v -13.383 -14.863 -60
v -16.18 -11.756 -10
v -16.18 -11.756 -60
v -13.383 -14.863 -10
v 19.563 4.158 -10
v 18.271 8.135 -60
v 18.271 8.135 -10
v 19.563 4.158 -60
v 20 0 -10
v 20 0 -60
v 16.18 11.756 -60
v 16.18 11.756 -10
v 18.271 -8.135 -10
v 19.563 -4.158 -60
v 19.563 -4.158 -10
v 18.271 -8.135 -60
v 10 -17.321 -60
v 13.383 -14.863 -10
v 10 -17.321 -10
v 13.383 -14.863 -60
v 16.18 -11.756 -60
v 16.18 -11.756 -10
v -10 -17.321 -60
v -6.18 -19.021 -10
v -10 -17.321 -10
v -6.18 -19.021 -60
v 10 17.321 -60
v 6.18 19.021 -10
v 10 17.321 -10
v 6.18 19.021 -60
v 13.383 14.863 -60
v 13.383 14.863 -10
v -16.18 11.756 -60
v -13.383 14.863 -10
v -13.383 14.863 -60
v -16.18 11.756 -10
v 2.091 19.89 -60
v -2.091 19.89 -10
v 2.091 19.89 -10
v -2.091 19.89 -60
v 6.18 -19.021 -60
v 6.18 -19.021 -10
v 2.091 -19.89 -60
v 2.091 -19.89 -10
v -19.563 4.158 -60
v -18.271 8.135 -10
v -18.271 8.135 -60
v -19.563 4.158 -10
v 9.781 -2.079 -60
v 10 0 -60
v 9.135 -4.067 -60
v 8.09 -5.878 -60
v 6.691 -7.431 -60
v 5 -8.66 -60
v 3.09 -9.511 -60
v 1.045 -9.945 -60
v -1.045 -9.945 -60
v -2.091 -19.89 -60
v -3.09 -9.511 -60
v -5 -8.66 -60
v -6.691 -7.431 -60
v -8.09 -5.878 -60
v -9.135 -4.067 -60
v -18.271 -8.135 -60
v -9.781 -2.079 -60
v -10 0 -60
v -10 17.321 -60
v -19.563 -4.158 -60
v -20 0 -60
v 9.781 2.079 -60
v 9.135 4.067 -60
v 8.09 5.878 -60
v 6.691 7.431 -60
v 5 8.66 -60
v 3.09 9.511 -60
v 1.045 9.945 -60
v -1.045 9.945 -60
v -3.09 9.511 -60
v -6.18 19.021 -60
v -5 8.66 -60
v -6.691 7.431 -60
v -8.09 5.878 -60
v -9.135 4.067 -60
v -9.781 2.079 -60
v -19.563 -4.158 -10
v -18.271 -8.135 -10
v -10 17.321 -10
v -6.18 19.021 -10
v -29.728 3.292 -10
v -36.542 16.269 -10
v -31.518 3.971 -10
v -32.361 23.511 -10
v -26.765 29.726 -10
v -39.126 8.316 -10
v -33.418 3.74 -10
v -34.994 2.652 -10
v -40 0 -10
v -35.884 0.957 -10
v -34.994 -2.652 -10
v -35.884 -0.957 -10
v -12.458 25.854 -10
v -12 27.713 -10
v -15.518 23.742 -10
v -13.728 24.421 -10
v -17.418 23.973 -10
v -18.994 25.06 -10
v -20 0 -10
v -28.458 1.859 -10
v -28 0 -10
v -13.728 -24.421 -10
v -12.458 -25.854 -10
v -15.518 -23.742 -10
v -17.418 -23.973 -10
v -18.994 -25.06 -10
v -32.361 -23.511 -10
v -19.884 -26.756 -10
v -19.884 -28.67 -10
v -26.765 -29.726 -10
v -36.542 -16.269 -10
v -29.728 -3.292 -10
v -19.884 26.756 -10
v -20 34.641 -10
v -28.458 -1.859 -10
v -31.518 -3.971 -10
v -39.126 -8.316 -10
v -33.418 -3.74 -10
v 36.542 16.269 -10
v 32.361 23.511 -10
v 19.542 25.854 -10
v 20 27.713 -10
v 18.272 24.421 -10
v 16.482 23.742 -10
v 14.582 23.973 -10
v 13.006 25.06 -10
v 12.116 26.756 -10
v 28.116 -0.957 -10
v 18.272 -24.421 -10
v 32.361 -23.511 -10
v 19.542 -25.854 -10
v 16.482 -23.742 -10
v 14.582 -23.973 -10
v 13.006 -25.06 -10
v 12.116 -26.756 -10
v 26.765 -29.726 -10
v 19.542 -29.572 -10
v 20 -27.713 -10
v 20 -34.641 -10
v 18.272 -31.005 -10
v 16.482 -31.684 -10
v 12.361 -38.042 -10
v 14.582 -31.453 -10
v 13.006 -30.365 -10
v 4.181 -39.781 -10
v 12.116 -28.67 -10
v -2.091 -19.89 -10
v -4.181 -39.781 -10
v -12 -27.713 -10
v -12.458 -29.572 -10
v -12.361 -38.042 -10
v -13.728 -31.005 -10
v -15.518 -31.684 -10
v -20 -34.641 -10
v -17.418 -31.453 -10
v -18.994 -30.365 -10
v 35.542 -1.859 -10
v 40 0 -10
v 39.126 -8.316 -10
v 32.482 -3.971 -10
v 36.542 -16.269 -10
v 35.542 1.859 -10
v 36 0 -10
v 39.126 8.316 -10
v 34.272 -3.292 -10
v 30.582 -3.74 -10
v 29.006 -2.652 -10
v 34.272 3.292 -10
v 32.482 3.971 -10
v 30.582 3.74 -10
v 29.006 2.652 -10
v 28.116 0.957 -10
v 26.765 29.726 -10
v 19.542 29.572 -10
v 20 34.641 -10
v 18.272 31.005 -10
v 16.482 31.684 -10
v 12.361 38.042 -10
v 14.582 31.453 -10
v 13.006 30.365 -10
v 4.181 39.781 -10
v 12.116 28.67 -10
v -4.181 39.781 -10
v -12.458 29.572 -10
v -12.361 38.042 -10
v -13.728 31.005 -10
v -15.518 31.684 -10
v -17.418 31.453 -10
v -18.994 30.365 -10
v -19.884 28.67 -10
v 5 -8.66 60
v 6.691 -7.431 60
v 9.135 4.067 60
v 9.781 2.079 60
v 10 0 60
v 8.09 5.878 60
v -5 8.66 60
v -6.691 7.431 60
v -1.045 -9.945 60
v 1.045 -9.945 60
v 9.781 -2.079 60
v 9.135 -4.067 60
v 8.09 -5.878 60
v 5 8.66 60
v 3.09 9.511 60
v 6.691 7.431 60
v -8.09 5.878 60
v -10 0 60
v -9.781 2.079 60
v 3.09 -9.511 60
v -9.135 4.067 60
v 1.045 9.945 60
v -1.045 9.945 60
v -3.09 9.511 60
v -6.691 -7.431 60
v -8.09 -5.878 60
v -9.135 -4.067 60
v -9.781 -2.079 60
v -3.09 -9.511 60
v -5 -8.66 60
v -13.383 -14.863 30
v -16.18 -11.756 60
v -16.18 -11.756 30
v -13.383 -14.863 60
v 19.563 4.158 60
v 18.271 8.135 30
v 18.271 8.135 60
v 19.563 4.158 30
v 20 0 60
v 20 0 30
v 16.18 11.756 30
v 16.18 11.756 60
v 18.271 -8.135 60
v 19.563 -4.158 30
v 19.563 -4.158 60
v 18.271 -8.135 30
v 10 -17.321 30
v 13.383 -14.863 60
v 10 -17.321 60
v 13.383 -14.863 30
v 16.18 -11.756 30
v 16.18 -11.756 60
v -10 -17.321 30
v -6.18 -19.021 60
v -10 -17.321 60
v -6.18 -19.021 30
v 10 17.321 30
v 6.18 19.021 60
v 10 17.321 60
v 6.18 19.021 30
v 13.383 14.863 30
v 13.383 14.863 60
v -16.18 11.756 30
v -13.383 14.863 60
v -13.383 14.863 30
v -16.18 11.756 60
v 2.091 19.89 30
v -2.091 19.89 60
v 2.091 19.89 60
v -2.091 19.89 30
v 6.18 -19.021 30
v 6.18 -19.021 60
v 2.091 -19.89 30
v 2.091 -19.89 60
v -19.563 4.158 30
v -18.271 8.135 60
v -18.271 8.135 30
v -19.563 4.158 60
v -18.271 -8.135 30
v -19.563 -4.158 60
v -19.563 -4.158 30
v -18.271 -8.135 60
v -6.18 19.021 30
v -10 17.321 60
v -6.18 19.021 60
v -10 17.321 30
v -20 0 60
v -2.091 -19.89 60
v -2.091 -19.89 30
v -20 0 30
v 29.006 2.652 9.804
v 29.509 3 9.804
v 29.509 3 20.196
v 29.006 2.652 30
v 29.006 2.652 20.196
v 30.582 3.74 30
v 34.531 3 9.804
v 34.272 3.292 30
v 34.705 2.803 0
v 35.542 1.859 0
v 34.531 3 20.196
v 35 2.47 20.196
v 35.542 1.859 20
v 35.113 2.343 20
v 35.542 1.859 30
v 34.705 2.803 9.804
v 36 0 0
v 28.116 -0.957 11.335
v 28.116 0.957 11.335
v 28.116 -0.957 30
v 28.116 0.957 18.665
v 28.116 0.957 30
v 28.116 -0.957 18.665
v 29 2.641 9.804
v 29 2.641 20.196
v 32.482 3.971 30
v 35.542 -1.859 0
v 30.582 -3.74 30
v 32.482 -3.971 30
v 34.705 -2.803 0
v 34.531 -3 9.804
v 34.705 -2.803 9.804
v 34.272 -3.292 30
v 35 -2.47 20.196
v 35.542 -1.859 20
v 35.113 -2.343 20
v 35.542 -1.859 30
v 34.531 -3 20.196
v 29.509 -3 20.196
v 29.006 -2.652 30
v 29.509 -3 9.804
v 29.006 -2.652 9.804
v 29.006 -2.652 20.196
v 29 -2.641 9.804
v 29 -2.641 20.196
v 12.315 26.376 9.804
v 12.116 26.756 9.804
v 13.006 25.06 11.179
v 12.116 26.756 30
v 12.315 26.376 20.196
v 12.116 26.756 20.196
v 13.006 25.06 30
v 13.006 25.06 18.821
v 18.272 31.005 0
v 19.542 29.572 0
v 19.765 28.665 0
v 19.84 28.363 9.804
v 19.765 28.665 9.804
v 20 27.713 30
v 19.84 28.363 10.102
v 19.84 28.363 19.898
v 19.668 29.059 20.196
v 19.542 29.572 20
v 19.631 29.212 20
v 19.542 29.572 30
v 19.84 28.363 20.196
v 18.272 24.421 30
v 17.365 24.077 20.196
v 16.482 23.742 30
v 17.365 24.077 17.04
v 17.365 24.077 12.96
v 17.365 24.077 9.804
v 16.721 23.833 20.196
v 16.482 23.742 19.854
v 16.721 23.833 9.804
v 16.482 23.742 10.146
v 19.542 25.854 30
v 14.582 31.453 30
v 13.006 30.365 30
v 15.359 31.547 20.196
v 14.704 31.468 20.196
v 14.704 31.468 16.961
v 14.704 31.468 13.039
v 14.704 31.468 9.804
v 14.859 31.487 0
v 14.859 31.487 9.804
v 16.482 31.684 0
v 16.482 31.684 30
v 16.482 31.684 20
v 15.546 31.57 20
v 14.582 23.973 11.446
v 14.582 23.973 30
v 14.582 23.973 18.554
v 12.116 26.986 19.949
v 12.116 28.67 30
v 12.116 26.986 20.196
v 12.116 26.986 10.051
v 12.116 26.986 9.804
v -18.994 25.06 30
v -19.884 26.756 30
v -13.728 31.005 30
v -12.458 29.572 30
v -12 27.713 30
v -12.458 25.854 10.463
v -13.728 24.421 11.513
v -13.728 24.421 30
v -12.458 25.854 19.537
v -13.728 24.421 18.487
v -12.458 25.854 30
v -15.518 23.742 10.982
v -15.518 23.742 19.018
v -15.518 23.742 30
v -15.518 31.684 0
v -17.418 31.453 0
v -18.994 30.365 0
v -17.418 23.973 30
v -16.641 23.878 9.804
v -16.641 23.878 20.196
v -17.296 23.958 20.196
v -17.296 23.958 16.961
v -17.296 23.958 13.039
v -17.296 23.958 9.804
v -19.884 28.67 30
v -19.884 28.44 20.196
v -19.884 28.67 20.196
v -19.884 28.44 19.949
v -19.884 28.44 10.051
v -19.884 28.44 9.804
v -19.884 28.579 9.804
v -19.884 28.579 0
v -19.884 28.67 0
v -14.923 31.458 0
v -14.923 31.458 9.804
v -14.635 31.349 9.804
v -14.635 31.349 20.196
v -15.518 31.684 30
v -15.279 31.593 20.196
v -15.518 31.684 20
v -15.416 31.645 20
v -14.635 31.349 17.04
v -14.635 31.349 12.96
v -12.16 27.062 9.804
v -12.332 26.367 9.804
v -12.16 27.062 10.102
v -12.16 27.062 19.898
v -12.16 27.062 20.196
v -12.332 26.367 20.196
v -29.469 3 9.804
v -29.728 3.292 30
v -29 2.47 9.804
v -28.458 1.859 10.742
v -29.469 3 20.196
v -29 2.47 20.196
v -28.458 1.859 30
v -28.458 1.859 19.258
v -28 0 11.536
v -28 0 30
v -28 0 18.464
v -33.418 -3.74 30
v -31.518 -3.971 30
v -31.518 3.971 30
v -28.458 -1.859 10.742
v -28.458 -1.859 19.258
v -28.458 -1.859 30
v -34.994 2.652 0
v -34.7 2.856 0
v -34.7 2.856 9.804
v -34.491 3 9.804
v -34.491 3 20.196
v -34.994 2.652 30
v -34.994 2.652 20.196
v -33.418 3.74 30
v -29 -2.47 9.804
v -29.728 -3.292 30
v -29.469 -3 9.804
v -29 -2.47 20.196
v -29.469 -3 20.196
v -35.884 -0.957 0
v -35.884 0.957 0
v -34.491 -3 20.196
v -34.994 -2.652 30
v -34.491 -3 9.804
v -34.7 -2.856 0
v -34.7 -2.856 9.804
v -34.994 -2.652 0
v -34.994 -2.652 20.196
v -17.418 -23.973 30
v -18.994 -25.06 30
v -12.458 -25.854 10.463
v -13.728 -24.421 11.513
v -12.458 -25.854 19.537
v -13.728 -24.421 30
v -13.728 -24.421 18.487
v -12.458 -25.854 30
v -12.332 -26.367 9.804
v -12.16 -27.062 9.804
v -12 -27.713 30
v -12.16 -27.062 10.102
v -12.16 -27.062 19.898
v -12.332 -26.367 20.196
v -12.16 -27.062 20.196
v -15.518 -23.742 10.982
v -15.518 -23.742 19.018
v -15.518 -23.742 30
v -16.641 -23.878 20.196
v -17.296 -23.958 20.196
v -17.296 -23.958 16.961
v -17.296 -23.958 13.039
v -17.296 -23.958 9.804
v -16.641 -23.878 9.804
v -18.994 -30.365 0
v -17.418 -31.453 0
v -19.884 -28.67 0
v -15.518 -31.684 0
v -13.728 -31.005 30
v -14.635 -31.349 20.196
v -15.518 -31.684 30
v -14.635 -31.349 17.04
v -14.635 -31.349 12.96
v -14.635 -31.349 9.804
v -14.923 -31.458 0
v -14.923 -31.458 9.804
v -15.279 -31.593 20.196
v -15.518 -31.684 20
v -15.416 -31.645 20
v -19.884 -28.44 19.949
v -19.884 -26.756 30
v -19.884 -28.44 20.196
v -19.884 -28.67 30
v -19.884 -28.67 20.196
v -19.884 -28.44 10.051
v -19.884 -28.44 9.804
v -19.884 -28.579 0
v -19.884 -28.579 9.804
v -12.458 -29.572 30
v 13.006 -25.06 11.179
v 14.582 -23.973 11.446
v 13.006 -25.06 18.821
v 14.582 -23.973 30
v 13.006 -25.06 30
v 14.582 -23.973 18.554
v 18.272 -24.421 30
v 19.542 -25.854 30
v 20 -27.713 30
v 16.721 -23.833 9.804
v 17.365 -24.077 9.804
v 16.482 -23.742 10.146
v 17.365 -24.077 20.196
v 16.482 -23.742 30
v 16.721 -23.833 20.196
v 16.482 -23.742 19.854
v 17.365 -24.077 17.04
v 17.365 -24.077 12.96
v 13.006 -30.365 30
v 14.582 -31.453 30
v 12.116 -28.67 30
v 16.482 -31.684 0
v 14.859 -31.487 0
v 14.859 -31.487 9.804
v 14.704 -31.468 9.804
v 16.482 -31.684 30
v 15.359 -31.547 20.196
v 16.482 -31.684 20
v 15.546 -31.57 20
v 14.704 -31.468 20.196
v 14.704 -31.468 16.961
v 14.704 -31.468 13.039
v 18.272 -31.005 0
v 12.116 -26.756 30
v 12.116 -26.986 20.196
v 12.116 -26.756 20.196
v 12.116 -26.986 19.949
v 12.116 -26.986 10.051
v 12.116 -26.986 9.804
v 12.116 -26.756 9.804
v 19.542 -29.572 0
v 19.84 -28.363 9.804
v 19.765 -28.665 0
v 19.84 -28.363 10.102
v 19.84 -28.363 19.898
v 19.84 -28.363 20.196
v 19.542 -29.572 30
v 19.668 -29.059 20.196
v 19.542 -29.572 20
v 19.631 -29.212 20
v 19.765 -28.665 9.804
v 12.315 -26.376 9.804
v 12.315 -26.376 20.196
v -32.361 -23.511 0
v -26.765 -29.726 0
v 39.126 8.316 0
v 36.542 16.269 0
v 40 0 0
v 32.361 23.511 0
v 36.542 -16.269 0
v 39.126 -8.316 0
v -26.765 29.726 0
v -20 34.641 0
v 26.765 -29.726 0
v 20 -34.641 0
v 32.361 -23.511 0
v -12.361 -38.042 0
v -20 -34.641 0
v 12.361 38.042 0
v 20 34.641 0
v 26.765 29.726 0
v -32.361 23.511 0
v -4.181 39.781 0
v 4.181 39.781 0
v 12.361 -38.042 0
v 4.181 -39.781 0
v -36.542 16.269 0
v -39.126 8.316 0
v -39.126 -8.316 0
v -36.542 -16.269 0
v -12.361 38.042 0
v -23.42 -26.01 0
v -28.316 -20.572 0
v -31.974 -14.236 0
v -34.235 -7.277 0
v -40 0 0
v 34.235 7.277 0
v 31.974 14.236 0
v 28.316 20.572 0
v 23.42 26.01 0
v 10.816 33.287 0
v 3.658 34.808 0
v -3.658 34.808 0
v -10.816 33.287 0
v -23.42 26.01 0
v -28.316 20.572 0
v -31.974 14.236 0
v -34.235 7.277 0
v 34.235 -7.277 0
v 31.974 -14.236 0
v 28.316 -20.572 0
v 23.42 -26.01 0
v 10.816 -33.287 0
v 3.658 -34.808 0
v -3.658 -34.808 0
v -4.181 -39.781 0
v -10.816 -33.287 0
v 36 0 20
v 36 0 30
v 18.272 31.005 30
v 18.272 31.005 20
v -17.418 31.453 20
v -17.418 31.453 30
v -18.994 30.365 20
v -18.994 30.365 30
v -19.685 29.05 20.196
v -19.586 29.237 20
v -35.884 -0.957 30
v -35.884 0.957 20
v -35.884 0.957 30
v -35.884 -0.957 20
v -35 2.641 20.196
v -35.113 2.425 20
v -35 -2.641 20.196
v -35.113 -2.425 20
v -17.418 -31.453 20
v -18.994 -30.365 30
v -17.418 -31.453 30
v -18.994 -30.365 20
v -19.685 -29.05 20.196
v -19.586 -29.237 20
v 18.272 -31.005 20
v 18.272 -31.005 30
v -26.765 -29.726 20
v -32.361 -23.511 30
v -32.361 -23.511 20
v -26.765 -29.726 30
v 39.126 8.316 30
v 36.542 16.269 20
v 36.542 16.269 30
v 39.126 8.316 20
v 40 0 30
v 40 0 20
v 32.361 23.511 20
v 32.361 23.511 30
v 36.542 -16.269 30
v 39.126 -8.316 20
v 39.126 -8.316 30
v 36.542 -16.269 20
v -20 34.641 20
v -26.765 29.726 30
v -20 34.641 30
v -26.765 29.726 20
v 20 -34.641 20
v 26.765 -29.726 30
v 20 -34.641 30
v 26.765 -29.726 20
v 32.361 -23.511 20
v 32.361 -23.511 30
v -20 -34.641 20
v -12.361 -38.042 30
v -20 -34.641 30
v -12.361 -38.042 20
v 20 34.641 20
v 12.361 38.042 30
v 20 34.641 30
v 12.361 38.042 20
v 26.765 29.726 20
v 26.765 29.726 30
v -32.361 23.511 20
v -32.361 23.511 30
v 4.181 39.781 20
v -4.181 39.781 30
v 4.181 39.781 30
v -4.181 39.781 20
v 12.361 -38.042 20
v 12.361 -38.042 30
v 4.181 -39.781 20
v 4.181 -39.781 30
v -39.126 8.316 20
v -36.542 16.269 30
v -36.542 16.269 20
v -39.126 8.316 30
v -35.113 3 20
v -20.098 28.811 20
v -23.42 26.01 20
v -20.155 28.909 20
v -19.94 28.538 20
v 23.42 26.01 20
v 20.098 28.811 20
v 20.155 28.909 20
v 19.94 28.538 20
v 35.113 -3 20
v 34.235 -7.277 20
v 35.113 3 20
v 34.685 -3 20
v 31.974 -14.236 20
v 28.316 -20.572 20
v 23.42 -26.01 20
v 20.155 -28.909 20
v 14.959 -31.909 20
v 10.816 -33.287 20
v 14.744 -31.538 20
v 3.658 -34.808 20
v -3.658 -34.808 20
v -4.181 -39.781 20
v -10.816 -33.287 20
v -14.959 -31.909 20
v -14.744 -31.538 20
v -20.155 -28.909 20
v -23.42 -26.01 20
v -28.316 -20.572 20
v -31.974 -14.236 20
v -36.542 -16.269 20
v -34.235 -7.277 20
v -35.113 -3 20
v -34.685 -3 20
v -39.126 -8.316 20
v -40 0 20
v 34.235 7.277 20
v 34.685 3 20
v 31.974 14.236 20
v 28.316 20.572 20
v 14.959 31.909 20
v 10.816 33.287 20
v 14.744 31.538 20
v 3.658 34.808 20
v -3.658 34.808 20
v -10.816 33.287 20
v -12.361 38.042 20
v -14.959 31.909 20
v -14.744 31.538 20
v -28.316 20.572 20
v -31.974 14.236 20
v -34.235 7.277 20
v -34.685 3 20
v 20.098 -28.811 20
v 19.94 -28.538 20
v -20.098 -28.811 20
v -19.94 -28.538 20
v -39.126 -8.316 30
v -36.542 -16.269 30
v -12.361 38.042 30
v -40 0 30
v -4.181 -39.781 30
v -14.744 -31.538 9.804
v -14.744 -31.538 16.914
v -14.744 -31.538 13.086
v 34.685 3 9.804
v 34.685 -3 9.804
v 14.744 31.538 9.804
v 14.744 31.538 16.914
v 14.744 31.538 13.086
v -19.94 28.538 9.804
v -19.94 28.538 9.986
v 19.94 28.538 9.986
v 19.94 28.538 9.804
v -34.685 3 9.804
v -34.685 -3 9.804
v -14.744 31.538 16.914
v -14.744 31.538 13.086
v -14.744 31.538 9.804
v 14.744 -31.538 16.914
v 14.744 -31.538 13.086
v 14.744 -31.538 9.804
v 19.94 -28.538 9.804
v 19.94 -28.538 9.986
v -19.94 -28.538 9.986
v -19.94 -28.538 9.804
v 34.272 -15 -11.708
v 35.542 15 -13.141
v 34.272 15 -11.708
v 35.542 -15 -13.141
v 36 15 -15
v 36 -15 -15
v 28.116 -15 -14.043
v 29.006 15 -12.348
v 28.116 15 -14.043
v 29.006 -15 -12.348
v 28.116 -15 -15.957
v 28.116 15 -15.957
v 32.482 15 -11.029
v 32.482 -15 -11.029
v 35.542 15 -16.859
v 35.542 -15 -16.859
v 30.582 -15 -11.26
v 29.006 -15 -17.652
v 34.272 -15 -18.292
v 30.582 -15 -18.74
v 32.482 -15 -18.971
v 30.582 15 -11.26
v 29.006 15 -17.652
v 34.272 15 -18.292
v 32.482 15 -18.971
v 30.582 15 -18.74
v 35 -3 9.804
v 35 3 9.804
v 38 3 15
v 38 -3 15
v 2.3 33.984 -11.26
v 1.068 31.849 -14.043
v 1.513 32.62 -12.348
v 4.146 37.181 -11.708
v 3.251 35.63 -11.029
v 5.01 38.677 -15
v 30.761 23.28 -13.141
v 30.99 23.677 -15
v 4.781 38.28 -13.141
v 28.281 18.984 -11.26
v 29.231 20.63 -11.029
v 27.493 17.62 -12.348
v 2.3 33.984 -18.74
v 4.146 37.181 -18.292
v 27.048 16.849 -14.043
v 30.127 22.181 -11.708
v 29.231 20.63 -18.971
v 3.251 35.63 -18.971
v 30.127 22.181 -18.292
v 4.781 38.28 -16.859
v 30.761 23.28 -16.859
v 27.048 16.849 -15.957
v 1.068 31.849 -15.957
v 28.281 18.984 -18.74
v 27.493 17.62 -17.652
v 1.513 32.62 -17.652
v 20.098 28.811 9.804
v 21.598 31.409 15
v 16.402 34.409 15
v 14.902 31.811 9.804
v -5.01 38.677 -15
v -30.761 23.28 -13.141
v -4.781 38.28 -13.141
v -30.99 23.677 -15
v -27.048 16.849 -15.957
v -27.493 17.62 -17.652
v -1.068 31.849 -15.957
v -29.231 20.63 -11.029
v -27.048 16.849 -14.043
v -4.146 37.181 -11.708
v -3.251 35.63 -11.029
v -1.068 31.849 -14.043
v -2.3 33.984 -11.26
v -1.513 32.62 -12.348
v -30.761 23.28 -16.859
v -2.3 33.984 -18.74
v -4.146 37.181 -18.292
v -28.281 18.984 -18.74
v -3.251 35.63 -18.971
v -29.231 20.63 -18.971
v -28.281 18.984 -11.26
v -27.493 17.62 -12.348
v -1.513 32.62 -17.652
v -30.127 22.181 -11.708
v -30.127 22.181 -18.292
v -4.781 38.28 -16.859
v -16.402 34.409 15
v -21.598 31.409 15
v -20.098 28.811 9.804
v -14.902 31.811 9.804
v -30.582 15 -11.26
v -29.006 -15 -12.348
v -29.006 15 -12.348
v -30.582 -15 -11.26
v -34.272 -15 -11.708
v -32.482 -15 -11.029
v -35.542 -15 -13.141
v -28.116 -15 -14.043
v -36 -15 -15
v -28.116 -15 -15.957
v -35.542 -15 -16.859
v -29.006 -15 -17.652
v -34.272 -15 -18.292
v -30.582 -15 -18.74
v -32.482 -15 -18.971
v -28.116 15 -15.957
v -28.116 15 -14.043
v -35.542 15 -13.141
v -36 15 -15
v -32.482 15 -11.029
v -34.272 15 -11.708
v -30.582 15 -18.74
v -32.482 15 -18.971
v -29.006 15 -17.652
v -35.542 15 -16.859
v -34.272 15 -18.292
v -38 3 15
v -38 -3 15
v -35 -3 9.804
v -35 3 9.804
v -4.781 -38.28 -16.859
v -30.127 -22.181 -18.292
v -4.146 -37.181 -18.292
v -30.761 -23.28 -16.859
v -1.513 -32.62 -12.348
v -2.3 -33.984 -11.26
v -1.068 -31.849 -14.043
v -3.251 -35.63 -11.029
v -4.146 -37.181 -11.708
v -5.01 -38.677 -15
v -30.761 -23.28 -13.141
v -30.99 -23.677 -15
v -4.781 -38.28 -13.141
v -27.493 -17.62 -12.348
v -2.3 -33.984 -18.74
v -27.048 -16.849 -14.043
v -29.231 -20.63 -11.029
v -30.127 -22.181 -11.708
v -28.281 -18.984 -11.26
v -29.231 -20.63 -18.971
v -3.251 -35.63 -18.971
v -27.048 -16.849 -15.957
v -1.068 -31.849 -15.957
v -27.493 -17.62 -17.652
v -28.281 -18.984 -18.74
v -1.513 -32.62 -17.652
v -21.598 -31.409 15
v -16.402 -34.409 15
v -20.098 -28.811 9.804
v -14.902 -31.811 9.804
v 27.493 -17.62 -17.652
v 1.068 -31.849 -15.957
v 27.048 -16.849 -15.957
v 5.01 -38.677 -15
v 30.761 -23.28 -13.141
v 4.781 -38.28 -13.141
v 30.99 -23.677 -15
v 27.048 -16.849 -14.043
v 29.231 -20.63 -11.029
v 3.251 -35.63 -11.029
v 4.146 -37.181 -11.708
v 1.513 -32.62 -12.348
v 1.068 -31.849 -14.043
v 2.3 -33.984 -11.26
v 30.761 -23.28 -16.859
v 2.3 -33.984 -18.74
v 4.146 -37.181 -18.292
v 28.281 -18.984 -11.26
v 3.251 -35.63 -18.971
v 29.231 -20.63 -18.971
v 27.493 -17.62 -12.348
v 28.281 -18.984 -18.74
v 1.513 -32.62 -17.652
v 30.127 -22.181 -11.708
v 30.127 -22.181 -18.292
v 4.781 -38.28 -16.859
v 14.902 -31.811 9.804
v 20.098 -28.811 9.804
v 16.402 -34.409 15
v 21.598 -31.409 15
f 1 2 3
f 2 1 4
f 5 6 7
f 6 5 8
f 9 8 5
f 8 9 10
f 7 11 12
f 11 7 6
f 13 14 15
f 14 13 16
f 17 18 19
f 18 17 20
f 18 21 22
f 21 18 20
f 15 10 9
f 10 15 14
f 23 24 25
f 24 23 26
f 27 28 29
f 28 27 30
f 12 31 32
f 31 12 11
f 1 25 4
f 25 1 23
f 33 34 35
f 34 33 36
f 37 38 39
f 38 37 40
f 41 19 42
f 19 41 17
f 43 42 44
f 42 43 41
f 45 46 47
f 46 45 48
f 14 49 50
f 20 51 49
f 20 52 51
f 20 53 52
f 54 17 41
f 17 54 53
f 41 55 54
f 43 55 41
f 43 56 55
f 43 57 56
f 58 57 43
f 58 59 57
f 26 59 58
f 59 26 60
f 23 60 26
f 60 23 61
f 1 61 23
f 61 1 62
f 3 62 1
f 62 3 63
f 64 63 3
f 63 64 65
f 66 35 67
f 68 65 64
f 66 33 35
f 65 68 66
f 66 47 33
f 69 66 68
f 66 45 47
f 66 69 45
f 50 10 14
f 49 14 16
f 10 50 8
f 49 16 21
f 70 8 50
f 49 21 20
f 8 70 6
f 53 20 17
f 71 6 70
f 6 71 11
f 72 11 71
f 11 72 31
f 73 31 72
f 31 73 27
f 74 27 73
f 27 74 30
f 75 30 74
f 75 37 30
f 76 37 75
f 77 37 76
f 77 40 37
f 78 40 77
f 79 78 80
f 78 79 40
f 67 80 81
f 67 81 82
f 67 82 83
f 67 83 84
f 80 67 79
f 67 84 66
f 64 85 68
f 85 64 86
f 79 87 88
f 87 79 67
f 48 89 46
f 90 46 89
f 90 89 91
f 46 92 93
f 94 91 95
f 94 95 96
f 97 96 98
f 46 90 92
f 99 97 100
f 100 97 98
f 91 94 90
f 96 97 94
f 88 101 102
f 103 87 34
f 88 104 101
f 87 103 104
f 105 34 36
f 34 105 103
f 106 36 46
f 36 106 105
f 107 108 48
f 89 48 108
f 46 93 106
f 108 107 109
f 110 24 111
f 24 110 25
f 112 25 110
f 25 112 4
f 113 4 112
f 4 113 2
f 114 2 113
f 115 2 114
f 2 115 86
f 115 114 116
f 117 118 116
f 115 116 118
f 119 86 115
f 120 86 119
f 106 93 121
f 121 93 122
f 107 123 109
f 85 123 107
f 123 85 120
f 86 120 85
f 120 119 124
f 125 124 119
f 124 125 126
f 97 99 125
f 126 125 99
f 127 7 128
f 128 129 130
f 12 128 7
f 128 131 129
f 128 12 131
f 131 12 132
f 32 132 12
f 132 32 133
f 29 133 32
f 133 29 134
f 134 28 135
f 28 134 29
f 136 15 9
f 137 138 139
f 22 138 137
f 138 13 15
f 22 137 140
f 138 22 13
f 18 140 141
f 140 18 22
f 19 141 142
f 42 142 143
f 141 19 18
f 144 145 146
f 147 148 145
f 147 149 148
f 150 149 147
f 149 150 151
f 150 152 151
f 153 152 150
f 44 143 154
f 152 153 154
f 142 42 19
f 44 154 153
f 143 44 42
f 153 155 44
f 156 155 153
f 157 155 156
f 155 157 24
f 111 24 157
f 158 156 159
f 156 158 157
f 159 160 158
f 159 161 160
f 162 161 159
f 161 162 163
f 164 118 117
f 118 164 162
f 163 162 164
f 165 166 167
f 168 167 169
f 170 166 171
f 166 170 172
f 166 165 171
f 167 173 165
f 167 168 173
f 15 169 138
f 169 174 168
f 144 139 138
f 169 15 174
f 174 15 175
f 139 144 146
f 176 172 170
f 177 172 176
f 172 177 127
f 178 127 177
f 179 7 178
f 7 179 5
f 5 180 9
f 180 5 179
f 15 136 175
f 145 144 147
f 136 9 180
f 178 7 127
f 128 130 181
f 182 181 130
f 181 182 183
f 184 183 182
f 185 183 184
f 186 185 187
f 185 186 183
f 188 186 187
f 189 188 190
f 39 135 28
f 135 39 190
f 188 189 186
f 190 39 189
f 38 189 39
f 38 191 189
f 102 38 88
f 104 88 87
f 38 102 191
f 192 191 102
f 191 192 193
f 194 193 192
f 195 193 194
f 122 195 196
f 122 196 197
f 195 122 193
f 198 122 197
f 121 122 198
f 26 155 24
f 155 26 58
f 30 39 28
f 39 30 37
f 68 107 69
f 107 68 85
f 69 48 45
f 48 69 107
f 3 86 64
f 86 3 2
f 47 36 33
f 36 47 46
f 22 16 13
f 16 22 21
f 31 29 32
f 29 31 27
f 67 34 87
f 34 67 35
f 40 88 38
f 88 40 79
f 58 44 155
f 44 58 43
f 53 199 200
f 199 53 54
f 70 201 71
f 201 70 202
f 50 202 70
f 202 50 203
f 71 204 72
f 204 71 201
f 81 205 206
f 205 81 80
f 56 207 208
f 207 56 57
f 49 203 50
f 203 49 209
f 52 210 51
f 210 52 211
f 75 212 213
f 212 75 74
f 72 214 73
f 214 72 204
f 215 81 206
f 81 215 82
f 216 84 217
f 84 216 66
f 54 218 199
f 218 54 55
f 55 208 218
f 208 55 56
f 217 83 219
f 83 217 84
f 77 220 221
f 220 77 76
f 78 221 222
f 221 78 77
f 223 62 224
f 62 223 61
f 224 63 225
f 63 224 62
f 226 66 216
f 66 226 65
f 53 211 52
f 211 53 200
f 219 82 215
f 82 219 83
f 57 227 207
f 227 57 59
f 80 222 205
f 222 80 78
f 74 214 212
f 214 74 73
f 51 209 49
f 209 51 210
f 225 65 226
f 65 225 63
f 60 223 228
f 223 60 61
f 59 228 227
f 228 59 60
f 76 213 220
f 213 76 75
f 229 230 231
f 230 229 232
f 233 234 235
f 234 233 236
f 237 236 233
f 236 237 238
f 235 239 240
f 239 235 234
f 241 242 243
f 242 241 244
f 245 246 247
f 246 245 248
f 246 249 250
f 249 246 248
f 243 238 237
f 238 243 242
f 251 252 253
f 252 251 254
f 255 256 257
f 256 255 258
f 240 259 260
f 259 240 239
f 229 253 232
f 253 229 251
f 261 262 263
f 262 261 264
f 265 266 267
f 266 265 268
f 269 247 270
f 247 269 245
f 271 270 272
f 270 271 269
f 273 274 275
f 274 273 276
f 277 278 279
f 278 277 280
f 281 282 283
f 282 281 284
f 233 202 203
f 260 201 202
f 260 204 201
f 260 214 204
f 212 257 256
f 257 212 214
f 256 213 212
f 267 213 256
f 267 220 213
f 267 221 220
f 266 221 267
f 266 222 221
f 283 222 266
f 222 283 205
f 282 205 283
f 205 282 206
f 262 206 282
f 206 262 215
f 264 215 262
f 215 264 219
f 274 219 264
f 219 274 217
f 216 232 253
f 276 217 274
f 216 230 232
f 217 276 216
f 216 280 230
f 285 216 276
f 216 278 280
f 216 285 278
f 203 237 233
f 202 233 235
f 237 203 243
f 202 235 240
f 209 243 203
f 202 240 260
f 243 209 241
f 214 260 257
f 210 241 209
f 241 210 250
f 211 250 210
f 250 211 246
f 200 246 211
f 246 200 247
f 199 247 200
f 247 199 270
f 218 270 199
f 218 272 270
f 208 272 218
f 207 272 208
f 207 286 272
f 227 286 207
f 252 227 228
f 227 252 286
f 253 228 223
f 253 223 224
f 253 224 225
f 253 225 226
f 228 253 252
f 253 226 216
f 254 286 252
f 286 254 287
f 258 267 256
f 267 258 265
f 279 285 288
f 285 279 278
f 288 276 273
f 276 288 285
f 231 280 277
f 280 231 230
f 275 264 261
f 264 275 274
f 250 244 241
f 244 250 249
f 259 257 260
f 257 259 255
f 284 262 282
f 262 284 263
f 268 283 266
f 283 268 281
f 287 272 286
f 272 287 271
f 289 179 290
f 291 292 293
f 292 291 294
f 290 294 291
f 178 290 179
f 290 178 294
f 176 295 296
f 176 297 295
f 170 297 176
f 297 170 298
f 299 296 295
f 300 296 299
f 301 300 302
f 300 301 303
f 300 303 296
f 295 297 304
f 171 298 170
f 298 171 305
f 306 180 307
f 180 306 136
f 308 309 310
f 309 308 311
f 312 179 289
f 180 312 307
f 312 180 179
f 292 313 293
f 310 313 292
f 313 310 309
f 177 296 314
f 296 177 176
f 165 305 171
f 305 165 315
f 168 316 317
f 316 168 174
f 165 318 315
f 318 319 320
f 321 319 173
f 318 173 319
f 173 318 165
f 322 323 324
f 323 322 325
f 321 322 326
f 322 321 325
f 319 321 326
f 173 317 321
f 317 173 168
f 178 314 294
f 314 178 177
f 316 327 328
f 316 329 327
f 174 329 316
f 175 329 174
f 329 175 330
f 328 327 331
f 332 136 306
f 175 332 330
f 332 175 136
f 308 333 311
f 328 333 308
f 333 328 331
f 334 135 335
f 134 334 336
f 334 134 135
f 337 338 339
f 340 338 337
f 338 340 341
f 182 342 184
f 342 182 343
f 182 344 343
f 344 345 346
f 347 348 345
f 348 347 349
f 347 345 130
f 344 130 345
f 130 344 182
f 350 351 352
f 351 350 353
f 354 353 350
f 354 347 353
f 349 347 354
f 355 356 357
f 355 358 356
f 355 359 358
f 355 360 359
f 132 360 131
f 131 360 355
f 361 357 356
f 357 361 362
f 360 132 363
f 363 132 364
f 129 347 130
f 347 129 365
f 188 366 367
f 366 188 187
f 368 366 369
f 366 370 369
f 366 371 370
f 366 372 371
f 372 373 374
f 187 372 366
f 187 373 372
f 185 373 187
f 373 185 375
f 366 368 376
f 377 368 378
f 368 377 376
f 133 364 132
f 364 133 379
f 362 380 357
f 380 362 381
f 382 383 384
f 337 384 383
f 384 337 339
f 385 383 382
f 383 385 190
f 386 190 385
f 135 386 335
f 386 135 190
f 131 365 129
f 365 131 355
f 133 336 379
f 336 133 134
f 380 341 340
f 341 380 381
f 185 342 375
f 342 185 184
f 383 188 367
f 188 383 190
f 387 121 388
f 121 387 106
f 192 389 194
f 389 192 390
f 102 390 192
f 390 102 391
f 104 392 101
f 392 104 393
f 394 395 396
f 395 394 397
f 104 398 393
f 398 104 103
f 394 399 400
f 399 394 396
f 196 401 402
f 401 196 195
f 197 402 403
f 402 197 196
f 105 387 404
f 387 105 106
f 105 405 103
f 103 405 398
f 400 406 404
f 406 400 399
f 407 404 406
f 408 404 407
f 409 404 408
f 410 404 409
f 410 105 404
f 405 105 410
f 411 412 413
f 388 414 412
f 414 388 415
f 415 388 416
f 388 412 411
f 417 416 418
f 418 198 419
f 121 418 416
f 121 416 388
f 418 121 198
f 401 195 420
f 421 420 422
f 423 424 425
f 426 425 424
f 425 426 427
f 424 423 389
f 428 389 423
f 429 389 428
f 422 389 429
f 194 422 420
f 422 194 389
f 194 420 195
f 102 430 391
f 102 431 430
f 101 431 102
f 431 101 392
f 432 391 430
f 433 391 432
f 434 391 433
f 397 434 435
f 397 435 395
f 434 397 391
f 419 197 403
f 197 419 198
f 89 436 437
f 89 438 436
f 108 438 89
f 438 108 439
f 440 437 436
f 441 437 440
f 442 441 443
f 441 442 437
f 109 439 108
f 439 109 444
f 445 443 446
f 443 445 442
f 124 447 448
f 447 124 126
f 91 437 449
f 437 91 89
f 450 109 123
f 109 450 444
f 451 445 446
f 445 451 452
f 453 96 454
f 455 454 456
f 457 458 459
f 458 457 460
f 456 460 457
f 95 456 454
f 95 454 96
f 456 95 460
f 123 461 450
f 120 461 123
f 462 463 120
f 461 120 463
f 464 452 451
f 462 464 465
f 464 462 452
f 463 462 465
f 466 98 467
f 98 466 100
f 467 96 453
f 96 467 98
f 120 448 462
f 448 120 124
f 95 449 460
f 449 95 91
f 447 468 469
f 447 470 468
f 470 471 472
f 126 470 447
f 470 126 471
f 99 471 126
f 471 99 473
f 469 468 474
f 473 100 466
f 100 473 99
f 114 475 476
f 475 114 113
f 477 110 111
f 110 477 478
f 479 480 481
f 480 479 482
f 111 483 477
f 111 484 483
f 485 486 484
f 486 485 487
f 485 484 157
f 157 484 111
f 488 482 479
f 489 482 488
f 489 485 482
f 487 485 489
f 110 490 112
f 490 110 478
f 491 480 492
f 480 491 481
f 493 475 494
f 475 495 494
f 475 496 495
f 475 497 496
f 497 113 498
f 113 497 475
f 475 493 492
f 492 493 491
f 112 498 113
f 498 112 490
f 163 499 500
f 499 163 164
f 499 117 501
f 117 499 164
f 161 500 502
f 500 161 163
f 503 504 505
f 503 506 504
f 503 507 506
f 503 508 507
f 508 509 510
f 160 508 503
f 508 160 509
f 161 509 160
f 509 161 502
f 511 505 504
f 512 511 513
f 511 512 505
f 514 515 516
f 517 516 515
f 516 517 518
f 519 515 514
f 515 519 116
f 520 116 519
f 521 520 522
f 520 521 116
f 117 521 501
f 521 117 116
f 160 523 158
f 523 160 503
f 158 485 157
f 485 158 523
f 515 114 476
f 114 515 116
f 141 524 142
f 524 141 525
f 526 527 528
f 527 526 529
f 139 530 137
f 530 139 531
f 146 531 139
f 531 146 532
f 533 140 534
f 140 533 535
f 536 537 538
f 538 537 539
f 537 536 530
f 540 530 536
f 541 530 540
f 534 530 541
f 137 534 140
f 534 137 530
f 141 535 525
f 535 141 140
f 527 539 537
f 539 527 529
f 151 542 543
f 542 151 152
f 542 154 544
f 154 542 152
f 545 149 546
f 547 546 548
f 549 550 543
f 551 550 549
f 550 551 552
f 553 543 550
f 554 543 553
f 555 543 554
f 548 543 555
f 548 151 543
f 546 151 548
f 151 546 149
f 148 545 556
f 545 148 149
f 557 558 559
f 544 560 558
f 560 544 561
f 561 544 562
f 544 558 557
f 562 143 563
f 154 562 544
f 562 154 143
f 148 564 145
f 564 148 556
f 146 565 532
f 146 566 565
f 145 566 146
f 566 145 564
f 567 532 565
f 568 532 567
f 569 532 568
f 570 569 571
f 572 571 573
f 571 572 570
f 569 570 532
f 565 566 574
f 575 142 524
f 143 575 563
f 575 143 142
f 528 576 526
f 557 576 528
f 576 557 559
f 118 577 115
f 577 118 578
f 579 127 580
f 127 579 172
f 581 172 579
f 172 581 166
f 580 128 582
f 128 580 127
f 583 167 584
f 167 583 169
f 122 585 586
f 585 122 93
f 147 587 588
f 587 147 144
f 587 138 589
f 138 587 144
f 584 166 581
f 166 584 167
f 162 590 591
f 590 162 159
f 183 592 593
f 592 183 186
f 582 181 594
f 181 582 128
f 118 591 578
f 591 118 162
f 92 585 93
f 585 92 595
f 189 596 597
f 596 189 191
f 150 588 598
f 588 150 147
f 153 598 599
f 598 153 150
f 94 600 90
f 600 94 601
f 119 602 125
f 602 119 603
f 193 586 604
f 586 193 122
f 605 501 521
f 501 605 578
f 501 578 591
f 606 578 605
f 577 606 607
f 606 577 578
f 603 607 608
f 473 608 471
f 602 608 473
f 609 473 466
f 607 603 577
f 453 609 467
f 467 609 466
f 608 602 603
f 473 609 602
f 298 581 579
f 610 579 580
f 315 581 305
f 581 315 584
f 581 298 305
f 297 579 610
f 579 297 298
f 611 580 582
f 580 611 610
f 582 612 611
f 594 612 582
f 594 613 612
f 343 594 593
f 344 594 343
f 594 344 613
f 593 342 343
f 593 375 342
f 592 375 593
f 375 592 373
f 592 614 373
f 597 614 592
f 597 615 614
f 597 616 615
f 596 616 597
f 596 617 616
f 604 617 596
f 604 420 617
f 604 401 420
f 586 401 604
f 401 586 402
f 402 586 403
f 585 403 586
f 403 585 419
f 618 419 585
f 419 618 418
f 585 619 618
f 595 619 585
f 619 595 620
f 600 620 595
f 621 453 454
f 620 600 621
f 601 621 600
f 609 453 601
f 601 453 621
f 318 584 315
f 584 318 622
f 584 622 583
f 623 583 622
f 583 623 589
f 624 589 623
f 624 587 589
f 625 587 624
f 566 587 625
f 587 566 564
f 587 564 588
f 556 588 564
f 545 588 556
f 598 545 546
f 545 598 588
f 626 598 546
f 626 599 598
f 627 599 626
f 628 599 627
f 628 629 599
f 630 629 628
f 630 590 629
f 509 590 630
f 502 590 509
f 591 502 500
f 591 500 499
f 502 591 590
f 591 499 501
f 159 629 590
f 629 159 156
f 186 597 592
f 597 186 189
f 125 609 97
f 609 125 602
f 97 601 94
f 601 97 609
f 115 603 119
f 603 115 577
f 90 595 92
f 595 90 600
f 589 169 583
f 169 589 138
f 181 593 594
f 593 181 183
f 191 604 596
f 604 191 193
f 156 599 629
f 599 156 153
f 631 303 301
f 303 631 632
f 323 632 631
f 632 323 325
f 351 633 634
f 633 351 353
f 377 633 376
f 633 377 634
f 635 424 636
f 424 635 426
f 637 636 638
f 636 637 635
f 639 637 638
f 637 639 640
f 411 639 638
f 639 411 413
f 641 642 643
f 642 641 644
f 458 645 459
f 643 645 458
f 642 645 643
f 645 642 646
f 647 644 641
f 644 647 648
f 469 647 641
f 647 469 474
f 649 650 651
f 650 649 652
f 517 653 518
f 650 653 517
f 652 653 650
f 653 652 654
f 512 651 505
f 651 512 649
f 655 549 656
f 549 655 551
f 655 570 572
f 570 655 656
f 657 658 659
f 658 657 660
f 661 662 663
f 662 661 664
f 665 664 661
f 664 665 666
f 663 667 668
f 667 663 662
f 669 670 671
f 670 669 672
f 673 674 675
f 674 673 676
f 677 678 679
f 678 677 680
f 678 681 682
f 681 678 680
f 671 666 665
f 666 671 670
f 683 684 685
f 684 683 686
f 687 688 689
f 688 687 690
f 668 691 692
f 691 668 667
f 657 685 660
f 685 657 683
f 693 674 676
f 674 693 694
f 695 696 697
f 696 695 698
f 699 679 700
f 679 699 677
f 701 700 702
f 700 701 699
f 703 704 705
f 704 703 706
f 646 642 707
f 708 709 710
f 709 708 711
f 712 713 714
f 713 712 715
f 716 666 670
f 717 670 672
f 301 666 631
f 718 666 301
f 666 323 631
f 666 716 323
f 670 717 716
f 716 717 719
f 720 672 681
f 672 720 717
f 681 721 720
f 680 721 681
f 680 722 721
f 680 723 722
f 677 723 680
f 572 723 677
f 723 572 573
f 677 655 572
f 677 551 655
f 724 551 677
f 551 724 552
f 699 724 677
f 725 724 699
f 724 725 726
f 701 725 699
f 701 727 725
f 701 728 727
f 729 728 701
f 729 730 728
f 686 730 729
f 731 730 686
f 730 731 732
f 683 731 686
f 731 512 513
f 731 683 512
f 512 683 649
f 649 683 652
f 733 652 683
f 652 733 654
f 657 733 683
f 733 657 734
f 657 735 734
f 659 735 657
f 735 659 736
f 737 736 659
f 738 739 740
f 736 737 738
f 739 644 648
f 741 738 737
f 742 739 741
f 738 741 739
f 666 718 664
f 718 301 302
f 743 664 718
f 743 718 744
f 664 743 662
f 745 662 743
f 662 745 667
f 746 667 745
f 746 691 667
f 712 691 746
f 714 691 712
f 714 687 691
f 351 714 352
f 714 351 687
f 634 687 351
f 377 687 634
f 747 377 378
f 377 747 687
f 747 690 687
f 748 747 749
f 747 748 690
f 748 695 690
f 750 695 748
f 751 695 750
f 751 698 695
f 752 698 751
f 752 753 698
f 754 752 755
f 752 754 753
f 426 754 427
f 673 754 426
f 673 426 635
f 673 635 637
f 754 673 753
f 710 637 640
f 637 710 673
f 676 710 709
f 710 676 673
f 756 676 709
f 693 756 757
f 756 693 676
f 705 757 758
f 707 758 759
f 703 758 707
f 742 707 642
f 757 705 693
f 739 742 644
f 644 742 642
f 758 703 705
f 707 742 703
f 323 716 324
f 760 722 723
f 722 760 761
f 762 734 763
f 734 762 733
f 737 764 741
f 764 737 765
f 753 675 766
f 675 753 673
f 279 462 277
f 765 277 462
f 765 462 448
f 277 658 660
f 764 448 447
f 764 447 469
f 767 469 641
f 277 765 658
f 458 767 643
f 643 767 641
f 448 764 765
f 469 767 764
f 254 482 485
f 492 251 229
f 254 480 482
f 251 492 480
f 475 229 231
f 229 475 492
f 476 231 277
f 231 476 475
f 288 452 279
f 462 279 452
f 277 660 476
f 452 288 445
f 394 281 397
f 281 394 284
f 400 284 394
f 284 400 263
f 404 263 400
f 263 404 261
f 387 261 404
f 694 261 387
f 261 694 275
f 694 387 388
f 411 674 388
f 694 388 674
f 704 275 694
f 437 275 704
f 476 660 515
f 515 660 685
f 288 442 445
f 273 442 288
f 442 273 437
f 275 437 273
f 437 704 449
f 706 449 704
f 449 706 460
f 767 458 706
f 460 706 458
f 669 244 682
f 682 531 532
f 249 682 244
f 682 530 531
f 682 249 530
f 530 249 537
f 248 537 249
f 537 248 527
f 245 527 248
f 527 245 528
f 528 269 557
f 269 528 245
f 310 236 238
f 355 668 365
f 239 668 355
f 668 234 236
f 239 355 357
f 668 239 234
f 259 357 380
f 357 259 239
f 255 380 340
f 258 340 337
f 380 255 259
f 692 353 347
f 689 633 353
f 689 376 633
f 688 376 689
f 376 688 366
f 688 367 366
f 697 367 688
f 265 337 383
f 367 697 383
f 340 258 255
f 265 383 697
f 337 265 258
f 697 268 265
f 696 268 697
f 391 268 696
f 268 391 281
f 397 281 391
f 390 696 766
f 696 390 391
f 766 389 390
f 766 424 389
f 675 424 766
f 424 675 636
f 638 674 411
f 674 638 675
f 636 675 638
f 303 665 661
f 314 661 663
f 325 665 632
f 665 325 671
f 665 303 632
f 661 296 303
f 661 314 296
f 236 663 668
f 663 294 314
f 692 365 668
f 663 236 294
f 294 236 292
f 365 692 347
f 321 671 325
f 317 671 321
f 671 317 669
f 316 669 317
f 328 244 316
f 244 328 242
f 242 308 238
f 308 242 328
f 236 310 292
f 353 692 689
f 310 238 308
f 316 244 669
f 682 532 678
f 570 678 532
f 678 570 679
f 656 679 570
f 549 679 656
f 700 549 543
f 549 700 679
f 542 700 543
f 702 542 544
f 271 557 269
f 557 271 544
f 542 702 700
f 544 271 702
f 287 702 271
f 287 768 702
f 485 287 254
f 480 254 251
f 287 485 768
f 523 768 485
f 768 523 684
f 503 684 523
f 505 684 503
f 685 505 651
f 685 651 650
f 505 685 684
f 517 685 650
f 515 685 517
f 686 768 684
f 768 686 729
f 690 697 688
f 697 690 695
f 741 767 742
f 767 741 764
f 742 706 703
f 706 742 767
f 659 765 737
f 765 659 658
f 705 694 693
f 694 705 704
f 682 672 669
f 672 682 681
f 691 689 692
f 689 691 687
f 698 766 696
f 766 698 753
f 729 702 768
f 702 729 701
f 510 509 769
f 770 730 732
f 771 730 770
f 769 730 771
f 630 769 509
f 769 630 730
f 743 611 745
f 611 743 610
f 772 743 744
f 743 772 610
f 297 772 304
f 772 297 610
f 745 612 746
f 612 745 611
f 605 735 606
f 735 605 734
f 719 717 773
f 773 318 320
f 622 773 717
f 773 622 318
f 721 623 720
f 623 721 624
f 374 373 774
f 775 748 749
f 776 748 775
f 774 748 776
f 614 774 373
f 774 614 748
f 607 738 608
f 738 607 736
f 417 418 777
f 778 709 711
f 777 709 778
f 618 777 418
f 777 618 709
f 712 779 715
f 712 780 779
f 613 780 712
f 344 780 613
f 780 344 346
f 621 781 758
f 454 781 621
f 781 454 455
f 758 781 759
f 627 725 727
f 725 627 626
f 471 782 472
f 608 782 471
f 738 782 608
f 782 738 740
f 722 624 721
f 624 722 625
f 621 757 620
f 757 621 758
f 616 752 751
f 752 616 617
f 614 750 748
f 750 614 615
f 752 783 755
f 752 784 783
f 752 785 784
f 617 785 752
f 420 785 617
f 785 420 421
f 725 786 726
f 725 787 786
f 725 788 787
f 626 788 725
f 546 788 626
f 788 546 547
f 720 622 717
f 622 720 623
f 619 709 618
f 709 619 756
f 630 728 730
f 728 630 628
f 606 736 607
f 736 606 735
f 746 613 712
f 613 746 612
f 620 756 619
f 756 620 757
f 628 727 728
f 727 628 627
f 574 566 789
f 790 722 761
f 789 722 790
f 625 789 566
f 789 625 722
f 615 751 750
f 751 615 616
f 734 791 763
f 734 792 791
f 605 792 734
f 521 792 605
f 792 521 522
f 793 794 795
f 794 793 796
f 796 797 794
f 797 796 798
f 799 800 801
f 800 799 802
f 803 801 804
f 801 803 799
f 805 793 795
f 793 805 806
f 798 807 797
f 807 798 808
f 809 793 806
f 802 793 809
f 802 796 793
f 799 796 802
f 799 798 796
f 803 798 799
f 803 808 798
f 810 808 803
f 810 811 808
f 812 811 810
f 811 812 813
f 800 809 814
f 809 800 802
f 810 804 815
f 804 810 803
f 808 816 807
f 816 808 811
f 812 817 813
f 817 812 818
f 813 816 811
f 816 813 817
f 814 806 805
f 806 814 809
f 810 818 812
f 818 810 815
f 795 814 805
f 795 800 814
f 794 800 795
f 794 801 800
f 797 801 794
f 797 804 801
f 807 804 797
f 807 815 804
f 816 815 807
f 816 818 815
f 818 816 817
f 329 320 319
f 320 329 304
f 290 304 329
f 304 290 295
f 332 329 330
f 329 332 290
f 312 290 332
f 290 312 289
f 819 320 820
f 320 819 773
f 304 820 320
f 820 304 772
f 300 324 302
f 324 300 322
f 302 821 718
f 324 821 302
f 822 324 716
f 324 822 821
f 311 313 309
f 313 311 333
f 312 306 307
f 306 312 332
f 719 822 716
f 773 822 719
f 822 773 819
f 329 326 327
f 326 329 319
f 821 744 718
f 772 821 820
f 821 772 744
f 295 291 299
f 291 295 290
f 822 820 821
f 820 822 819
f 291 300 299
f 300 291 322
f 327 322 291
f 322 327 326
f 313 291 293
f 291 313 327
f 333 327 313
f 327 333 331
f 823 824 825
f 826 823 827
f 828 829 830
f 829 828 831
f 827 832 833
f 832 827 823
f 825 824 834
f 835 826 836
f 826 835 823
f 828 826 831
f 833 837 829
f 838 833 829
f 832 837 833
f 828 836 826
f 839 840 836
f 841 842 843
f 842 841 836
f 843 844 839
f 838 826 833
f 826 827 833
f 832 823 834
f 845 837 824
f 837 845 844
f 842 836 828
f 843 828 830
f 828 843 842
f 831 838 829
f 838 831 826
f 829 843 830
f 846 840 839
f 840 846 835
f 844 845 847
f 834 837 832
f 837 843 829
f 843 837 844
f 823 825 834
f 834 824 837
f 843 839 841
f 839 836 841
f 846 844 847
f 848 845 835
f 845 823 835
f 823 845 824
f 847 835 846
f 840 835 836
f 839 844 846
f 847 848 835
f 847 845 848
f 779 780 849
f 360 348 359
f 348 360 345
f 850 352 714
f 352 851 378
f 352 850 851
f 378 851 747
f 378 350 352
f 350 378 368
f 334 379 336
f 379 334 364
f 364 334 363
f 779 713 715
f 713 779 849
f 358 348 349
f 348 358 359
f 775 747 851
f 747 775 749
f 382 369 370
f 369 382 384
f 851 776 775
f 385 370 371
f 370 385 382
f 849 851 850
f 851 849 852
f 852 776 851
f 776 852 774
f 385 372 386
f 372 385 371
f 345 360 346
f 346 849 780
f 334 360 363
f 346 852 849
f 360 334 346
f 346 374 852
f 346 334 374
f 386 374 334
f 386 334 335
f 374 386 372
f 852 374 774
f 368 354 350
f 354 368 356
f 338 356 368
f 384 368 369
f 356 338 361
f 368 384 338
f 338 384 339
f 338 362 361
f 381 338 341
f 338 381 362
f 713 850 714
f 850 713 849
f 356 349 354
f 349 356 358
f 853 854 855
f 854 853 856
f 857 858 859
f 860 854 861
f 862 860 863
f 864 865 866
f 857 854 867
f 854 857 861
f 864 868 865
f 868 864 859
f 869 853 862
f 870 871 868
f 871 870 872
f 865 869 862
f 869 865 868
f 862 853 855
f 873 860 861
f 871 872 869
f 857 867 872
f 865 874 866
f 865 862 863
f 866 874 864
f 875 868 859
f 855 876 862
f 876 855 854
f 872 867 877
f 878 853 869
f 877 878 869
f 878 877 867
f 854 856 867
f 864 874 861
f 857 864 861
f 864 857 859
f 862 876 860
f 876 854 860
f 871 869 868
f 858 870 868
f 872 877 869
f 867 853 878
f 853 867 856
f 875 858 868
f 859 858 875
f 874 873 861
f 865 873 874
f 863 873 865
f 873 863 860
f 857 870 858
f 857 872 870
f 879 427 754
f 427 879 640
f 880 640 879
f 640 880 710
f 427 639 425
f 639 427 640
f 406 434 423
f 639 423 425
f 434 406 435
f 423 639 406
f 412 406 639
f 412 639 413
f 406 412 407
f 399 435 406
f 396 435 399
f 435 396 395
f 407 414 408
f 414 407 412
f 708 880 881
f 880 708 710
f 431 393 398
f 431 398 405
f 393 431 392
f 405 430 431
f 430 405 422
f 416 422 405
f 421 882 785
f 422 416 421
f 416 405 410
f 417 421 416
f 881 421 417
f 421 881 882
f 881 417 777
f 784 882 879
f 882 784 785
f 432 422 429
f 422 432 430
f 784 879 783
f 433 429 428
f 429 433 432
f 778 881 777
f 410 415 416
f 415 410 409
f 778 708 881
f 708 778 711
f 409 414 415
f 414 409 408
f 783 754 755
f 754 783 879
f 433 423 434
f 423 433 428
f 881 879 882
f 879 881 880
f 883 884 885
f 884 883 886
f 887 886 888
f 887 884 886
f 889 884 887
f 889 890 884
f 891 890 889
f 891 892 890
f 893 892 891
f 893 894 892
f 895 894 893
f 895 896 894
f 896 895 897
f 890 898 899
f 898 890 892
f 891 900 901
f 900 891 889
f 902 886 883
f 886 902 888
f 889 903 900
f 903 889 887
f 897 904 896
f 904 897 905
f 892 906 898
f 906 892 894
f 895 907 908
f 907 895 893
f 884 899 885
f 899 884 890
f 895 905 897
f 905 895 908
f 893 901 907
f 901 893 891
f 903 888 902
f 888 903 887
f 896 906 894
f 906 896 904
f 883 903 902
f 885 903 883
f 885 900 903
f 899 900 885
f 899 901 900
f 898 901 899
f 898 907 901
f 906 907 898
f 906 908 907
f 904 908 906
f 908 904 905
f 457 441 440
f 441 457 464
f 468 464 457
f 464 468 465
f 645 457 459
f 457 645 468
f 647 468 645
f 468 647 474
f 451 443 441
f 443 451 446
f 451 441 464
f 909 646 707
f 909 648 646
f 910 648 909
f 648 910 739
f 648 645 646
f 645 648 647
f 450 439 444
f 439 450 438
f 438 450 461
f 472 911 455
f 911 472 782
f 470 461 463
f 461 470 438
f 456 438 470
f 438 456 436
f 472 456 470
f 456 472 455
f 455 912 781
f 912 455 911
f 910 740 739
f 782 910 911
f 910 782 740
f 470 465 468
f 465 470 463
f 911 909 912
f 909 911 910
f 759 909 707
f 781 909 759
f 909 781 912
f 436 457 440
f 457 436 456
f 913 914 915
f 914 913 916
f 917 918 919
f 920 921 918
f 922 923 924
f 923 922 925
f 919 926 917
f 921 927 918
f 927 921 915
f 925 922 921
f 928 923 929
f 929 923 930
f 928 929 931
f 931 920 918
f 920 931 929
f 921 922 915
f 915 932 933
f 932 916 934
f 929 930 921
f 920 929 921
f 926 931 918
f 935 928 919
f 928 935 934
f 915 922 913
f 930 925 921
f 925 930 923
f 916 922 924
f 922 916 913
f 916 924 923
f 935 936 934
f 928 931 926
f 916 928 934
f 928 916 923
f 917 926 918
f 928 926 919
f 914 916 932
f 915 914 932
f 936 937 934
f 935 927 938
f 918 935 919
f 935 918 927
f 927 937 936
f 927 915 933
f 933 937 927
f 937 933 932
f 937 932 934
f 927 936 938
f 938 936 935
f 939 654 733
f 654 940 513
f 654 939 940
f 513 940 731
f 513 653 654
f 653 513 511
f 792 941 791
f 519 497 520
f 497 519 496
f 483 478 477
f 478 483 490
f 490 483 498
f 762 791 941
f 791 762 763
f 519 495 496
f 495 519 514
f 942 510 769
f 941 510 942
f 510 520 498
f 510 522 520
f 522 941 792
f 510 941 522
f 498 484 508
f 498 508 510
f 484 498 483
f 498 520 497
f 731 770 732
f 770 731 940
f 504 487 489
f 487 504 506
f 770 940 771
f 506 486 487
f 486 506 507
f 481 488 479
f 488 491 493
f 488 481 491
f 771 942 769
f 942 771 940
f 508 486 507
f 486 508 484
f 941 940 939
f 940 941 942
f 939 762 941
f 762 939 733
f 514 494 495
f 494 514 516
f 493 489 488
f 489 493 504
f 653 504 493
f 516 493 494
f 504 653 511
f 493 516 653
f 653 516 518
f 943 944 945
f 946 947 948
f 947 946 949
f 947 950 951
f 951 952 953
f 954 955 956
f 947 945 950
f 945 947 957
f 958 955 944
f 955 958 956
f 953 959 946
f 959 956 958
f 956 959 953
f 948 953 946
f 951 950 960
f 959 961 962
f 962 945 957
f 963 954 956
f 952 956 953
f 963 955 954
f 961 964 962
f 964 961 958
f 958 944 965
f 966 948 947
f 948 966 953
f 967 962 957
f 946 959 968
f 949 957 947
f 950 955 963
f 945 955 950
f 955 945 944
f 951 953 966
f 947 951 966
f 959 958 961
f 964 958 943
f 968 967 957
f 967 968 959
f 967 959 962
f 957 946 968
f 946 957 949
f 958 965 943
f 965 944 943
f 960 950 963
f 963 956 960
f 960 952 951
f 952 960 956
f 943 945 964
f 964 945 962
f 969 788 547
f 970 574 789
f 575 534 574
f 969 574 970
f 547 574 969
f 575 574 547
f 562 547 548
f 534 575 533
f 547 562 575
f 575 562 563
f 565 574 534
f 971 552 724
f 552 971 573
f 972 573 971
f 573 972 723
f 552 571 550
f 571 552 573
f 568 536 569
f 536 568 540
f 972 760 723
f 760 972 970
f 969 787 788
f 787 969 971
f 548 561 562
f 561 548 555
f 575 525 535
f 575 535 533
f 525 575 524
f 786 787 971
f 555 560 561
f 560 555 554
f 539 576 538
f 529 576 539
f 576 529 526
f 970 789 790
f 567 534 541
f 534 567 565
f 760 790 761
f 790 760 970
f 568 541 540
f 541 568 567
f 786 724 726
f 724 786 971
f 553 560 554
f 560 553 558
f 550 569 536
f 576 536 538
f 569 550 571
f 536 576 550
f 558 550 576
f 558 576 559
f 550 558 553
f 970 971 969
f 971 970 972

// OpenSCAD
// Parameters
shaft_hub_diameter = 40;
shaft_hub_length = 50;
shaft_hole_diameter = 20;
flange_diameter = 80;
flange_thickness = 10;
bolt_hole_diameter = 8;
bolt_count = 6;
bolt_length = 30;
bolt_diameter = 8;
nut_diameter = 12;
nut_thickness = 6;
spacer_diameter = 70;
spacer_thickness = 20;

// Function to create a shaft hub
module shaft_hub() {
    difference() {
        cylinder(d=shaft_hub_diameter, h=shaft_hub_length, center=true);
        cylinder(d=shaft_hole_diameter, h=shaft_hub_length + 2, center=true);
    }
}

// Function to create a flange plate
module flange_plate() {
    difference() {
        cylinder(d=flange_diameter, h=flange_thickness, center=true);
        cylinder(d=shaft_hole_diameter, h=flange_thickness + 2, center=true);
        for (i = [0:bolt_count-1]) {
            angle = i * 360 / bolt_count;
            translate([flange_diameter/2.5 * cos(angle), flange_diameter/2.5 * sin(angle), 0])
                cylinder(d=bolt_hole_diameter, h=flange_thickness + 2, center=true);
        }
    }
}

// Function to create the spacer element
module spacer_element() {
    difference() {
        cylinder(d=spacer_diameter, h=spacer_thickness, center=true);
        cylinder(d=shaft_hole_diameter, h=spacer_thickness + 2, center=true);
        for (i = [0:bolt_count-1]) {
            angle = i * 360 / bolt_count;
            translate([flange_diameter/2.5 * cos(angle), flange_diameter/2.5 * sin(angle), 0])
                cylinder(d=bolt_hole_diameter, h=spacer_thickness + 2, center=true);
        }
    }
}

// Function to create a bolt
module bolt() {
    cylinder(d=bolt_diameter, h=bolt_length, center=true);
}

// Function to create a nut
module nut() {
    cylinder(d=nut_diameter, h=nut_thickness, center=true, $fn=6);
}

// Assembly
module coupling() {
    translate([0, 0, -shaft_hub_length/2 - flange_thickness])
        shaft_hub();
    
    translate([0, 0, shaft_hub_length/2 + flange_thickness])
        shaft_hub();
    
    translate([0, 0, -flange_thickness/2])
        flange_plate();
    
    translate([0, 0, flange_thickness/2 + spacer_thickness])
        flange_plate();
    
    translate([0, 0, spacer_thickness/2])
        spacer_element();
    
    for (i = [0:bolt_count-1]) {
        angle = i * 360 / bolt_count;
        translate([flange_diameter/2.5 * cos(angle), flange_diameter/2.5 * sin(angle), -bolt_length/2])
            rotate([90, 0, angle])
                bolt();
        
        translate([flange_diameter/2.5 * cos(angle), flange_diameter/2.5 * sin(angle), bolt_length/2])
            rotate([90, 0, angle])
                nut();
    }
}

// Render the coupling
coupling();
